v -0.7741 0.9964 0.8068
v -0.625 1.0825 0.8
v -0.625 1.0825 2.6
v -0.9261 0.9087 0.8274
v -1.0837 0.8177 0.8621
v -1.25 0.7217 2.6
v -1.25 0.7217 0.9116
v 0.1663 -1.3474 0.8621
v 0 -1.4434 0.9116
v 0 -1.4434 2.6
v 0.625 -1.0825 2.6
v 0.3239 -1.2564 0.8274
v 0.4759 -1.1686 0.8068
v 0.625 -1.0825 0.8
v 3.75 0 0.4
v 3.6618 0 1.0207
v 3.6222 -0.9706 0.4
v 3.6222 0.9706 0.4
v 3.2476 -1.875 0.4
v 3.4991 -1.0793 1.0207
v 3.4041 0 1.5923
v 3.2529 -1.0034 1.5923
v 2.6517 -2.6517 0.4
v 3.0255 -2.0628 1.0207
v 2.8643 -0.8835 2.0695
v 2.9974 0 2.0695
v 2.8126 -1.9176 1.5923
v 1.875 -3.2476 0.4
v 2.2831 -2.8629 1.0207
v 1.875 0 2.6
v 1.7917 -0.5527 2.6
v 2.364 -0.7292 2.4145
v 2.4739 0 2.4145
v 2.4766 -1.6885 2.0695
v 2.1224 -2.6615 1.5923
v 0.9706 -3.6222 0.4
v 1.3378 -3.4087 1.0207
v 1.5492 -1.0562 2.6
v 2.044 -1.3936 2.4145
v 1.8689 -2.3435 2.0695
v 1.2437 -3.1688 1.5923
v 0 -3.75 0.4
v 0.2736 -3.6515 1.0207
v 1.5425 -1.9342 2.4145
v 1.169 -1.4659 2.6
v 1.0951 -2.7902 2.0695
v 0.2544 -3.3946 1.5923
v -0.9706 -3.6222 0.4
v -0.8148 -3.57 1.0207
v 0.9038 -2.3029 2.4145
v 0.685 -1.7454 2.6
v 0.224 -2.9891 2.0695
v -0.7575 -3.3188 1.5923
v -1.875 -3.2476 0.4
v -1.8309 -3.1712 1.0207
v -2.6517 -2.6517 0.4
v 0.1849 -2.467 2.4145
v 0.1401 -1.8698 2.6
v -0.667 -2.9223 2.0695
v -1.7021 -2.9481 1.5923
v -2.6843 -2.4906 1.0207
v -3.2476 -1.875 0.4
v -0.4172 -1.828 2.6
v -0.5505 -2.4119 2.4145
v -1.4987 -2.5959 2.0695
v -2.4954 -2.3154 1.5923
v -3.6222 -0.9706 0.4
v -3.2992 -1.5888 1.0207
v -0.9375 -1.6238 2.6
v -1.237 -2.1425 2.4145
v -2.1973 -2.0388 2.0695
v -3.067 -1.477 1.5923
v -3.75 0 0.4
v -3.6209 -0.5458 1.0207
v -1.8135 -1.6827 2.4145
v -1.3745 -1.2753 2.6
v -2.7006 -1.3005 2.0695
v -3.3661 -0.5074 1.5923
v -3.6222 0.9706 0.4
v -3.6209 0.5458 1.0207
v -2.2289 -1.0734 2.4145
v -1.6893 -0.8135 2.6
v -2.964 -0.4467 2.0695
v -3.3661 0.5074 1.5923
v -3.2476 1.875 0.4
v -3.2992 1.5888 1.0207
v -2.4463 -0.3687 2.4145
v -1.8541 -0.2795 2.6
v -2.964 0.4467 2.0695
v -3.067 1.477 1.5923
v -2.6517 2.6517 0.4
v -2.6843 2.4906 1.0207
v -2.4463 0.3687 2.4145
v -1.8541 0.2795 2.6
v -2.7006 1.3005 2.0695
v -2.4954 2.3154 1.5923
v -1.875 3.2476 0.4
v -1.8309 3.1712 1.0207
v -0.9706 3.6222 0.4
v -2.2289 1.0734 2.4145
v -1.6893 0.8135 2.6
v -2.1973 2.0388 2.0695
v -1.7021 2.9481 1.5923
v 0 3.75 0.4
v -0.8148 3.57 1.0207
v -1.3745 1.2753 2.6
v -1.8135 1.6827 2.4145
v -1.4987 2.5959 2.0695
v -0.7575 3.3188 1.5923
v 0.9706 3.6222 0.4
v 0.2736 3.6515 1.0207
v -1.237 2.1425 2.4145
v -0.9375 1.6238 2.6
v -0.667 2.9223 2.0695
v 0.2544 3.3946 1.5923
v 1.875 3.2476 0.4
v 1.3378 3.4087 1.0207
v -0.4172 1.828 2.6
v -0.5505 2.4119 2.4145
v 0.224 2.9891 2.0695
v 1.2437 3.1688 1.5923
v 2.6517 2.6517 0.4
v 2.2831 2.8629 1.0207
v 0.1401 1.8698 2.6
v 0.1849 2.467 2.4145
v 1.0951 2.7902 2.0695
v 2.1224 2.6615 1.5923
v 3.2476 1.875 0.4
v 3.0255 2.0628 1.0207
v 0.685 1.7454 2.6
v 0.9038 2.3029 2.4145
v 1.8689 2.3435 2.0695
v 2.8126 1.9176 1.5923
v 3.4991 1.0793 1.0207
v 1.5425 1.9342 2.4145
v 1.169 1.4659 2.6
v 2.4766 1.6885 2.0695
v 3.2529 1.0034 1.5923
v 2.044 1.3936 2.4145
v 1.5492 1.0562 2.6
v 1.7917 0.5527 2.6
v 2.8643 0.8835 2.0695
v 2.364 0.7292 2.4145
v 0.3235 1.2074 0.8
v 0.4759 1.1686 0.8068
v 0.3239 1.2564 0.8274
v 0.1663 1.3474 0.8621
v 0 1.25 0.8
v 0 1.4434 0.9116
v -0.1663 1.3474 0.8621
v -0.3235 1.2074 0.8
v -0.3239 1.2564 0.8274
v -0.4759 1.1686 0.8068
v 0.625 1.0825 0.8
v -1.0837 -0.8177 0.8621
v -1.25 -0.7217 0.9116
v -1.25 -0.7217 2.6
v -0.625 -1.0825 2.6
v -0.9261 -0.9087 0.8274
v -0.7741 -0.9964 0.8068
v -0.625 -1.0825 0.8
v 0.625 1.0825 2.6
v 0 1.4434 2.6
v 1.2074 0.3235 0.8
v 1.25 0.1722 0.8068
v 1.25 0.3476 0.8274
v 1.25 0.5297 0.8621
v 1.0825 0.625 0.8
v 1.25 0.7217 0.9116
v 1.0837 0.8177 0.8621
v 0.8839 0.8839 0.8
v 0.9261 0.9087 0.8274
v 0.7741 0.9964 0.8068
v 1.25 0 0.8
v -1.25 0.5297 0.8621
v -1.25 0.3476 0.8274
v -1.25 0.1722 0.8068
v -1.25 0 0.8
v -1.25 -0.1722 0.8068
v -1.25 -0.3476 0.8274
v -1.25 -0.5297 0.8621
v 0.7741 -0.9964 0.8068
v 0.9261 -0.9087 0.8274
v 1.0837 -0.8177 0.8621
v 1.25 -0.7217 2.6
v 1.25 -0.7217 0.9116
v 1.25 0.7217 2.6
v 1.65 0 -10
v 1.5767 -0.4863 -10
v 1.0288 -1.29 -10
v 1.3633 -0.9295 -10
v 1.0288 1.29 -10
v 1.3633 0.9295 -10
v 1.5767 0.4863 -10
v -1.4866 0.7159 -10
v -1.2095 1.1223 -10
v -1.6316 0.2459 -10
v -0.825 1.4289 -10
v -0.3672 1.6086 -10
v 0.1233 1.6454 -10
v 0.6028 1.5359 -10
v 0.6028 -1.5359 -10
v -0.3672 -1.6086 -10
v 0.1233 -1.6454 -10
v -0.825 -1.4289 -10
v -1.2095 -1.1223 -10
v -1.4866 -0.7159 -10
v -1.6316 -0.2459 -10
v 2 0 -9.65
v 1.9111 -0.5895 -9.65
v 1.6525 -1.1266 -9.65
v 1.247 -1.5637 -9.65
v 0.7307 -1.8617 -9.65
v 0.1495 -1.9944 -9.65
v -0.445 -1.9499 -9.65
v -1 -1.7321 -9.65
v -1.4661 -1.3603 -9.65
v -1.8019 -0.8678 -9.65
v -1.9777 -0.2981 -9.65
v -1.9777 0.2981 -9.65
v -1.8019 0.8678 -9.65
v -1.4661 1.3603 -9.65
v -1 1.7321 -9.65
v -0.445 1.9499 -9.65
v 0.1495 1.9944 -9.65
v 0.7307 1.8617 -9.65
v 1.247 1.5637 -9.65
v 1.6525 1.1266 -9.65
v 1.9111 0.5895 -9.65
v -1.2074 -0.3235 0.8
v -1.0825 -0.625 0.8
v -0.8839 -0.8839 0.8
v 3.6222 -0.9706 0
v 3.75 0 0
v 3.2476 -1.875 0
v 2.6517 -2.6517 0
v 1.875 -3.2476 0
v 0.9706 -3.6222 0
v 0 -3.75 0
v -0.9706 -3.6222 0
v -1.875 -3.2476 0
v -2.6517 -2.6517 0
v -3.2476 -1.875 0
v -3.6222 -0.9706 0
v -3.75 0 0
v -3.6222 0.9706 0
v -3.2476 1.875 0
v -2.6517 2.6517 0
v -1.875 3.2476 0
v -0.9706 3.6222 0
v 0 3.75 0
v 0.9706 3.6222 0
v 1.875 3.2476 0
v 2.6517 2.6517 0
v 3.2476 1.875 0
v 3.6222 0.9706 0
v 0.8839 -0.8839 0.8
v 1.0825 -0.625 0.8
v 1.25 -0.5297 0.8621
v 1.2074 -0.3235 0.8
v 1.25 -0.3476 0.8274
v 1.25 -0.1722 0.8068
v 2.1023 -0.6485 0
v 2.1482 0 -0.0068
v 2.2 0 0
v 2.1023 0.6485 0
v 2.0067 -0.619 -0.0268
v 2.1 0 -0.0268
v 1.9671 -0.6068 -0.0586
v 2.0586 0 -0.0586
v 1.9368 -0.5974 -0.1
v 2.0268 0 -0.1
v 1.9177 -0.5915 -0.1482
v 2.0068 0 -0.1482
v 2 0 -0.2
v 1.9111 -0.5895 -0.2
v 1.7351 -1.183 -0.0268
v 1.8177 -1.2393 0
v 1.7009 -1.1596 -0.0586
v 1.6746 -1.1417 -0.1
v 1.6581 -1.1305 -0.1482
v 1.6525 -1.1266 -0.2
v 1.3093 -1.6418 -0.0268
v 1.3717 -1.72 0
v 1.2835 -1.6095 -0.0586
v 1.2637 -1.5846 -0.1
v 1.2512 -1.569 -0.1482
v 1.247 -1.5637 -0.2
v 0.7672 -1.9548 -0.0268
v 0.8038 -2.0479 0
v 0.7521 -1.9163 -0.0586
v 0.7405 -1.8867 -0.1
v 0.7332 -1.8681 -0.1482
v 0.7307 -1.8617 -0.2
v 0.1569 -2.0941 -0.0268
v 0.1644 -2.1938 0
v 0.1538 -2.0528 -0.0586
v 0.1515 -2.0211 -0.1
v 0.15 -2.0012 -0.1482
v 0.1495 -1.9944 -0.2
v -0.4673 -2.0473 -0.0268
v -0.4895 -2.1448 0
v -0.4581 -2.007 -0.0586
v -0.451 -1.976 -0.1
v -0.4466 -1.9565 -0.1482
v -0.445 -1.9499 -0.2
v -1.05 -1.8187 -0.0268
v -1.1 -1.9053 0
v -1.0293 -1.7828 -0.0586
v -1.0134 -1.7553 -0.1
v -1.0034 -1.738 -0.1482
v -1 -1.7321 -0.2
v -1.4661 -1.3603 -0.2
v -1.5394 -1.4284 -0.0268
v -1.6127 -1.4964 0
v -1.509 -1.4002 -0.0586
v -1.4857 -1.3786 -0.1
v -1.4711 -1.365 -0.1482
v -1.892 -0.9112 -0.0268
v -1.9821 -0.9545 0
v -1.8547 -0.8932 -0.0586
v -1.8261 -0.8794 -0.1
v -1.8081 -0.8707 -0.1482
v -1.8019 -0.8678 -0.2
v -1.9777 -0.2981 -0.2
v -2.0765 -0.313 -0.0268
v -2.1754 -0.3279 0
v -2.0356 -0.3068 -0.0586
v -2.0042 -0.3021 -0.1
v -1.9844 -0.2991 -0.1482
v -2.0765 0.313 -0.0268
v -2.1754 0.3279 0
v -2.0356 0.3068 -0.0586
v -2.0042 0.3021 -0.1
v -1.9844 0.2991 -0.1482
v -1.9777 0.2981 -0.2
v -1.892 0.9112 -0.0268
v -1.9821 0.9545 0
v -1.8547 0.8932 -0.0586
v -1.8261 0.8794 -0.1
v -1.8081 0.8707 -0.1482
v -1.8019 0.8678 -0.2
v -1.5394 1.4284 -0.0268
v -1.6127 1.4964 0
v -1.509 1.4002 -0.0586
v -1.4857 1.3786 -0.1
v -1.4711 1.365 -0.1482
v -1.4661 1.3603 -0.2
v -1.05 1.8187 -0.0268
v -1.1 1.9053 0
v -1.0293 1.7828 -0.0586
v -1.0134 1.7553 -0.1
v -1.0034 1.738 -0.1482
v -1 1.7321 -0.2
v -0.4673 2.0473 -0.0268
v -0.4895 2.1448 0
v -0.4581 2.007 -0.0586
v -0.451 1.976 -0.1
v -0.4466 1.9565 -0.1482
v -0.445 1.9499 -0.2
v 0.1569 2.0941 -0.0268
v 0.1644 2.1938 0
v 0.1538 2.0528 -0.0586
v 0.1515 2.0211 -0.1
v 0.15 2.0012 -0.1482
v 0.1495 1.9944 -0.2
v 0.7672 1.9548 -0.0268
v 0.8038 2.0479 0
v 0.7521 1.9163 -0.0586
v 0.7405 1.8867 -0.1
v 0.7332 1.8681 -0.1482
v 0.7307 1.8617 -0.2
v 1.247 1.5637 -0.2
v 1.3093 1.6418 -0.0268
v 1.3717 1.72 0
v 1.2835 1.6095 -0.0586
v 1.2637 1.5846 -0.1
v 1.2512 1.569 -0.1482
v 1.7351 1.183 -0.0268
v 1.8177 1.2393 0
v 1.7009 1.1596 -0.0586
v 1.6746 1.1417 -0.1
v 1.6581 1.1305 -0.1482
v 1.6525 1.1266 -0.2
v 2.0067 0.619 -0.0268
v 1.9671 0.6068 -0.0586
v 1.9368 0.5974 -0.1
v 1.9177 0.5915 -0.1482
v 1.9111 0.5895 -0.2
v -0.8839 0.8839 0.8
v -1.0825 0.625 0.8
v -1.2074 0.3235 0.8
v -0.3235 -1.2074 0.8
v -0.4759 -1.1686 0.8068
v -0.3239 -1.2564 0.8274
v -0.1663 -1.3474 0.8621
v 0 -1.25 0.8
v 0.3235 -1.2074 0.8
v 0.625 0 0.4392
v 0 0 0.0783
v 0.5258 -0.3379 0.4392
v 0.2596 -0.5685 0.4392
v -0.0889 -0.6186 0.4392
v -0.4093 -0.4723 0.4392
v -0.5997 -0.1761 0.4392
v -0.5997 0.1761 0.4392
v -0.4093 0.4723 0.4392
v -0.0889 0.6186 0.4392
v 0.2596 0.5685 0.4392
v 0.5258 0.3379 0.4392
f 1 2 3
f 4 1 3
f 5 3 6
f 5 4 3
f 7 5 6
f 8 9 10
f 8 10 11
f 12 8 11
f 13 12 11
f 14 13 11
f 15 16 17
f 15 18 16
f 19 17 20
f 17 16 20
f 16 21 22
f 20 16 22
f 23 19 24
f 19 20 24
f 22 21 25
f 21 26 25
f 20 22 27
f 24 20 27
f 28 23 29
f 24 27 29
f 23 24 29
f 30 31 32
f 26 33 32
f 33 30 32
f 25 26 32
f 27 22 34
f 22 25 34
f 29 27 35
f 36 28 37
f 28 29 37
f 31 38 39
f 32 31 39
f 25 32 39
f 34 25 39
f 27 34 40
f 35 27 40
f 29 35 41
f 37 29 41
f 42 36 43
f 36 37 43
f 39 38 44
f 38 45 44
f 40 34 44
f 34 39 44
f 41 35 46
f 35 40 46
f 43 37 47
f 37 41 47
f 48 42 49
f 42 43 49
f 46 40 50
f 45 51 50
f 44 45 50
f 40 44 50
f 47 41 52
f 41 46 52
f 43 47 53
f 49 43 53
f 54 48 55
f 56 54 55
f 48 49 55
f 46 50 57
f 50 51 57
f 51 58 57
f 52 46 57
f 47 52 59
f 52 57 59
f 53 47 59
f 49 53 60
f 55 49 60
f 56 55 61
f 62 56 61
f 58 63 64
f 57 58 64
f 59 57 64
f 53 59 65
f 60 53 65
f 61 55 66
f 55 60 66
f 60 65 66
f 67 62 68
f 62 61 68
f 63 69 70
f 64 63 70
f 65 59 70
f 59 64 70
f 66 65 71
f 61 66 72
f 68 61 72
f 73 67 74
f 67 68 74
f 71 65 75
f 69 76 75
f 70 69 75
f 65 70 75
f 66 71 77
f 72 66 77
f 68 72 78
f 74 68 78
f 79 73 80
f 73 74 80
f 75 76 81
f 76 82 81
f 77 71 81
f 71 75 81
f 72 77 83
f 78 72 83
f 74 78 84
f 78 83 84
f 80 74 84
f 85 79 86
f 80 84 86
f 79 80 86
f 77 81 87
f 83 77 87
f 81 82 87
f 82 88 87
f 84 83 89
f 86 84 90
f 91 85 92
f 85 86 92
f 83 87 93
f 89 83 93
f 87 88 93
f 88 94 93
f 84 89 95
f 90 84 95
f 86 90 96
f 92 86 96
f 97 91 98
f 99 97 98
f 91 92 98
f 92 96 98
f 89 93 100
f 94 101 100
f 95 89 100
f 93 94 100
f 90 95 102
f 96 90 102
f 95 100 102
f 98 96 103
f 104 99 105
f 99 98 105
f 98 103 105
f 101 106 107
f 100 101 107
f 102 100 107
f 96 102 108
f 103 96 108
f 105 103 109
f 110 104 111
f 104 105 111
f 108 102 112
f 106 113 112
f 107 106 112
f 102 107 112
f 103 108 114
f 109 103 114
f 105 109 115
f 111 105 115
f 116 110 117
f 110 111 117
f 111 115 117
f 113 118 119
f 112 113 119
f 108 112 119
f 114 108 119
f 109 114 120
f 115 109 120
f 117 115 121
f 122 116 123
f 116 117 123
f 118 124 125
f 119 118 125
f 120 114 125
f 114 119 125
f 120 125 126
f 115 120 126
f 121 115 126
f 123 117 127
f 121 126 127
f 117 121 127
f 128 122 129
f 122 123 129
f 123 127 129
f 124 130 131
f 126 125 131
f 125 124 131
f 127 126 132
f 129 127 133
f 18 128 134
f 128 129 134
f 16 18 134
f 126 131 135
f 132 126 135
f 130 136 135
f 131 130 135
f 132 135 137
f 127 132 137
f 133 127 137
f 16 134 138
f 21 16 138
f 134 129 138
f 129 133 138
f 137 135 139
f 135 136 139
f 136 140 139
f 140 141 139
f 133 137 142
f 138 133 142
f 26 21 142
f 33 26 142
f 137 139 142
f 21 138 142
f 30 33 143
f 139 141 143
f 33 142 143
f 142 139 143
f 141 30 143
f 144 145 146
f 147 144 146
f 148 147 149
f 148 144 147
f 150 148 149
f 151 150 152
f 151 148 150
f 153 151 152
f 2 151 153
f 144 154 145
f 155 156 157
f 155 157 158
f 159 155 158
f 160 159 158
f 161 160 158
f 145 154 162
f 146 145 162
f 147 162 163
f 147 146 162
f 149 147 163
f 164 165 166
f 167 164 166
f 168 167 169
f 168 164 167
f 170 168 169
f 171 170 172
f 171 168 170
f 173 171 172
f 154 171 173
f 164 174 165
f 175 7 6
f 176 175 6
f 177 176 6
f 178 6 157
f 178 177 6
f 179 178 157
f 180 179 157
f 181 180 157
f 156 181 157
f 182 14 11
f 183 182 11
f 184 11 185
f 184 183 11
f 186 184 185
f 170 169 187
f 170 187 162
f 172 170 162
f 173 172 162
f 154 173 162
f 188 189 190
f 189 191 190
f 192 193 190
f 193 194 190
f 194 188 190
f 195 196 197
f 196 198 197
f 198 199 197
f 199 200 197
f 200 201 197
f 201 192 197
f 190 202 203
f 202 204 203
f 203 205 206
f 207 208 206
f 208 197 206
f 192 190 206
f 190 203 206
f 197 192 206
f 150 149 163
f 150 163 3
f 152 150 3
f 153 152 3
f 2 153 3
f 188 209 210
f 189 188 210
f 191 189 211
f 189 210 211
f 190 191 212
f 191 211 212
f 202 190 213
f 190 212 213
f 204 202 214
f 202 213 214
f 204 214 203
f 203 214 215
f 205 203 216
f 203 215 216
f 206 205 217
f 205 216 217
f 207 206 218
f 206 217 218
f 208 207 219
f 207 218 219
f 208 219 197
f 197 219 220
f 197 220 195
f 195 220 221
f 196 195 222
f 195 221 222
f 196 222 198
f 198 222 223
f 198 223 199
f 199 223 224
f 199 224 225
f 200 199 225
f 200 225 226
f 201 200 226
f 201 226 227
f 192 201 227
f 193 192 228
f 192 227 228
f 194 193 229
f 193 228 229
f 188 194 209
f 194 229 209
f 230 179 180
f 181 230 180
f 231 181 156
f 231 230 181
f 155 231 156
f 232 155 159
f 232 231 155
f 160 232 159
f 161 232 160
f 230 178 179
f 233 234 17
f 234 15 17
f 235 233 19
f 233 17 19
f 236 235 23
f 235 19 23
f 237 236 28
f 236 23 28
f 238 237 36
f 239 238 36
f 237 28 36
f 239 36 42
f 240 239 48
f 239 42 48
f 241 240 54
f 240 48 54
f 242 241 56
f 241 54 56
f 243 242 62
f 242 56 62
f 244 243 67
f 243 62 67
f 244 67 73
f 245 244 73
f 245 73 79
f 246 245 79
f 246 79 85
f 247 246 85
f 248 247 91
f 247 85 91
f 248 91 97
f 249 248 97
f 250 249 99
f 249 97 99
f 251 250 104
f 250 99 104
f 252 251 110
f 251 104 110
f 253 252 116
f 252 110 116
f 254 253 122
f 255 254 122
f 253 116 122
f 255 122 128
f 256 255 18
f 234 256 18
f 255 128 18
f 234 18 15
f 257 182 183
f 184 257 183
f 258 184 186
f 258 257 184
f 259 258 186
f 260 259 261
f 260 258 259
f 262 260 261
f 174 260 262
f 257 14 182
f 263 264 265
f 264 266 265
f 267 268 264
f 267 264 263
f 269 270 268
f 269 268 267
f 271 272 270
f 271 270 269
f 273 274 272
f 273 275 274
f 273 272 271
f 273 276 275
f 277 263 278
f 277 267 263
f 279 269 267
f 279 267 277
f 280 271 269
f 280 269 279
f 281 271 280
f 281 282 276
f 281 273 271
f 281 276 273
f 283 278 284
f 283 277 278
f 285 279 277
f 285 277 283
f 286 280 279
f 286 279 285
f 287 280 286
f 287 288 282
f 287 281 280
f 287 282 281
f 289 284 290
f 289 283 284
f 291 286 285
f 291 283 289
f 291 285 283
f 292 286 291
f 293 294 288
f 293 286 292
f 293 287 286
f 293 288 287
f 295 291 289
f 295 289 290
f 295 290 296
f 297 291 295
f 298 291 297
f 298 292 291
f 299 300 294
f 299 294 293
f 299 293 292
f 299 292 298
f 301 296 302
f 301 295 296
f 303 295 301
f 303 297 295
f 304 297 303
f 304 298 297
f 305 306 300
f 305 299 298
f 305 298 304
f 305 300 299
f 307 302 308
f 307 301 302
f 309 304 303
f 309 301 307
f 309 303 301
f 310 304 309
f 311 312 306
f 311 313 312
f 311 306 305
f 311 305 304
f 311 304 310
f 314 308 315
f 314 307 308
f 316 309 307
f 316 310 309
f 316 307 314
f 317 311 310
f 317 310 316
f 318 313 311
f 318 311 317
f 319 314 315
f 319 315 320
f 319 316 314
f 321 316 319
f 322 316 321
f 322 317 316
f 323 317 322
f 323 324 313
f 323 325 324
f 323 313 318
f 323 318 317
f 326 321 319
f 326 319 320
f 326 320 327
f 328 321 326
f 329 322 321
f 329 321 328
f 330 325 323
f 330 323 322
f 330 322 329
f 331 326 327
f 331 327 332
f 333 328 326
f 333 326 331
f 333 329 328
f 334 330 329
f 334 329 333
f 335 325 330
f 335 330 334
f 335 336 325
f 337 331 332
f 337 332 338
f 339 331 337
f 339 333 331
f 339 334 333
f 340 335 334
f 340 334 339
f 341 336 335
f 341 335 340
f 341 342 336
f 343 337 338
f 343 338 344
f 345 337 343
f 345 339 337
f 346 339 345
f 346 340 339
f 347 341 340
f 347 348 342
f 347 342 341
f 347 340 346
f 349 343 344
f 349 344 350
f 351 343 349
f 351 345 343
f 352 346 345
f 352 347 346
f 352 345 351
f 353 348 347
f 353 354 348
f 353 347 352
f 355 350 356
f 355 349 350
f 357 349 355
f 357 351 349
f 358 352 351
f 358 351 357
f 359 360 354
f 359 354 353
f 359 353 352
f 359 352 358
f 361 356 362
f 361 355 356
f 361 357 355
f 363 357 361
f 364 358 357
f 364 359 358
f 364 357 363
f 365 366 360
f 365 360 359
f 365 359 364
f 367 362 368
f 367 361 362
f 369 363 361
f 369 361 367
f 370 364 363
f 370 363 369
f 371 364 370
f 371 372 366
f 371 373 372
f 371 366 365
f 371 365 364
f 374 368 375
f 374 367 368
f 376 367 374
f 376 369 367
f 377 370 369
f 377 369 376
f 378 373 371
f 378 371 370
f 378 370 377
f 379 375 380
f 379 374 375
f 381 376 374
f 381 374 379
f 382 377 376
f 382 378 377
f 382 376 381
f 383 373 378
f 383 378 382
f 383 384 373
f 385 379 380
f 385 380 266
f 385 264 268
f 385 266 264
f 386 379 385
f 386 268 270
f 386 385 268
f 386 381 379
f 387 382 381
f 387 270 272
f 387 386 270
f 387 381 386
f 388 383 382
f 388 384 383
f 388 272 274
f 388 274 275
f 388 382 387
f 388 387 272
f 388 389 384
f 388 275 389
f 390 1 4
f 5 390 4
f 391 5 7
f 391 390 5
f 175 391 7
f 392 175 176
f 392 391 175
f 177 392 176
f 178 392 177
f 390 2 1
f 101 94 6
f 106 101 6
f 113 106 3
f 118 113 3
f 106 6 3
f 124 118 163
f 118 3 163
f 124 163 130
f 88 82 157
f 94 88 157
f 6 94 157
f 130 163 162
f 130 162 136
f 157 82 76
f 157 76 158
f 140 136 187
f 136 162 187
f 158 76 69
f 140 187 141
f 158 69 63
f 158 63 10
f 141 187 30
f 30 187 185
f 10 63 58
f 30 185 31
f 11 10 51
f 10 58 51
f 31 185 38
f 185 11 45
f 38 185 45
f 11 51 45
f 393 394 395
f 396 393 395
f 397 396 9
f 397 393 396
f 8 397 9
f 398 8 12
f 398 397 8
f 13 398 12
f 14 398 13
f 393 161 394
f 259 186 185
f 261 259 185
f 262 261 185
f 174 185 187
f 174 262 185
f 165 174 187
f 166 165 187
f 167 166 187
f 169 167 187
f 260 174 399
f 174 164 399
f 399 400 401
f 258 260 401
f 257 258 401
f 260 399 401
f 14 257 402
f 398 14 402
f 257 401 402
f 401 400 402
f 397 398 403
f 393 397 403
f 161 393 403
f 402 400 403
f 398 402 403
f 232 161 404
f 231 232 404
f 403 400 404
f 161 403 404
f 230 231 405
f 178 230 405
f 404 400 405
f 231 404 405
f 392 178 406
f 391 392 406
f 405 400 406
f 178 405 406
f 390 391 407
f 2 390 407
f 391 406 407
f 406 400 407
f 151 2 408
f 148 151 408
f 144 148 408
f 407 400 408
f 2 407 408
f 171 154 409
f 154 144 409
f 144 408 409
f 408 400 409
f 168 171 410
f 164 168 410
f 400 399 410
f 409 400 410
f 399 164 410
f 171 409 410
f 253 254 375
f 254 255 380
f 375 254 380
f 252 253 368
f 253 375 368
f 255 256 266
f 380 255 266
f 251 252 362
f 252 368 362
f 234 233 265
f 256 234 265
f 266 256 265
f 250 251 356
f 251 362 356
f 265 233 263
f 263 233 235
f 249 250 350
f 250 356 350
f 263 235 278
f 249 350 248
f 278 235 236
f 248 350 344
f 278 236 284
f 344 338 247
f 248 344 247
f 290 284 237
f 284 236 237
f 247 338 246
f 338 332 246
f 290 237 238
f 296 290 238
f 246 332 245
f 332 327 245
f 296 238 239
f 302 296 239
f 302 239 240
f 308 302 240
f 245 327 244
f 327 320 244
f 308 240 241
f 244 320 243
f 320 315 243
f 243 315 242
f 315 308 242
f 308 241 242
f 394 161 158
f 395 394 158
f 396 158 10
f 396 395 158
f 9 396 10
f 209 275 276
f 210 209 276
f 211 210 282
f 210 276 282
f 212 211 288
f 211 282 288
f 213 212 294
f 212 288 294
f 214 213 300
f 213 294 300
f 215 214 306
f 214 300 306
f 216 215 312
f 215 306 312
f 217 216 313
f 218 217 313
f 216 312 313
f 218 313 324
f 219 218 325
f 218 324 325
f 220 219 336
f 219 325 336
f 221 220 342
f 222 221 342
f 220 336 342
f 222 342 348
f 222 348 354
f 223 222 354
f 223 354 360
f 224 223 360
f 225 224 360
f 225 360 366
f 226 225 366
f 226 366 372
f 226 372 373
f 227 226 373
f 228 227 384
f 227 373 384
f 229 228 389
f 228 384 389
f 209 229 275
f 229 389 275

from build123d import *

# Parameters (mm, degrees)
CHAMFER1_SIZE      = 0.35
CUT_EXTRUDE1_START = -1.8000001
CUT_EXTRUDE1_DEPTH = 2.8000001
FILLET1_R          = 0.2


with BuildPart() as part:
    # Sketch1 → Revolve1 (revolve)
    with BuildSketch(Plane(origin=(0, 0, 0), x_dir=(0, 0, -1), z_dir=(1, 0, 0)), mode=Mode.PRIVATE) as revolve1_sk:
        with BuildLine():
            Line((10, 0), (10, 2))
            Line((10, 2), (0, 2))
            Line((0, 2), (0, 3.75))
            Line((0, 3.75), (-0.4, 3.75))
            ThreePointArc((-0.4, 3.75), (-1.845304899, 3.217657748), (-2.6, 1.875))
            Line((-2.6, 1.875), (-2.6, 0))
            Line((-2.6, 0), (10, 0))
        make_face()
    revolve(revolve1_sk.sketch.rotate(Axis((0, 0, 30.809969789), (0, 0, -1)), 90), axis=Axis((0, 0, 30.809969789), (0, 0, -1)))

    # Chamfer1
    chamfer1_edges = [part.edges().sort_by_distance(p)[0] for p in [
        (-2, 0, -10),
    ]]
    chamfer(chamfer1_edges, length=CHAMFER1_SIZE)

    # Sketch2 → Cut-Revolve1 (revolve, cut)
    with BuildSketch(Plane(origin=(0, 0, 0), x_dir=(0, 0, -1), z_dir=(1, 0, 0)), mode=Mode.PRIVATE) as cut_revolve1_sk:
        Polygon((-2.6, 0), (-2.6, 1.25), (-0.8, 1.25), (-0.078312164, 0), align=None)
    revolve(cut_revolve1_sk.sketch.rotate(Axis((0, 0, 2.452500839), (0, 0, -1)), 90), axis=Axis((0, 0, 2.452500839), (0, 0, -1)), mode=Mode.SUBTRACT)

    # Cut-Extrude1: read off the stored shape, not the designer's step
    # Cut-Extrude1 outline → Cut-Extrude1 (cut)
    with BuildSketch(Plane.XY.offset(2.6).offset(CUT_EXTRUDE1_START)):
        with BuildLine():
            Line((1.25, 0), (1.25, 0.721687836))
            Line((1.25, 0.721687836), (0.625, 1.082531755))
            ThreePointArc((0.625, 1.082531755), (1.082531755, 0.625), (1.25, 0))
        make_face()
        with BuildLine():
            ThreePointArc((-0.625, 1.082531755), (0, 1.25), (0.625, 1.082531755))
            Line((0.625, 1.082531755), (0, 1.443375673))
            Line((0, 1.443375673), (-0.625, 1.082531755))
        make_face()
        with BuildLine():
            Line((1.25, -0.721687836), (1.25, 0))
            ThreePointArc((1.25, 0), (1.082531755, -0.625), (0.625, -1.082531755))
            Line((0.625, -1.082531755), (1.25, -0.721687836))
        make_face()
        with BuildLine():
            ThreePointArc((-1.25, 0), (-1.082531755, 0.625), (-0.625, 1.082531755))
            Line((-0.625, 1.082531755), (-1.25, 0.721687836))
            Line((-1.25, 0.721687836), (-1.25, 0))
        make_face()
        with BuildLine():
            Line((0, -1.443375673), (0.625, -1.082531755))
            ThreePointArc((0.625, -1.082531755), (0, -1.25), (-0.625, -1.082531755))
            Line((-0.625, -1.082531755), (0, -1.443375673))
        make_face()
        with BuildLine():
            ThreePointArc((-0.625, -1.082531755), (-1.082531755, -0.625), (-1.25, 0))
            Line((-1.25, 0), (-1.25, -0.721687836))
            Line((-1.25, -0.721687836), (-0.625, -1.082531755))
        make_face()
    extrude(amount=CUT_EXTRUDE1_DEPTH, mode=Mode.SUBTRACT)

    # Cut-Extrude1 2 outline → Cut-Extrude1 2 (revolve)
    with BuildSketch(Plane.XZ):
        Polygon((1.443375738, 0.911645534), (1.249999957, 0.799999975), (1.443375673, 0.7999999), align=None)
    revolve(axis=Axis((0, 0, 0), (0, 0, 1)))

    # Fillet1
    fillet1_edges = [part.edges().sort_by_distance(p)[0] for p in [
        (-2, 0, 0),
    ]]
    fillet(fillet1_edges, radius=FILLET1_R)


solid = part.part
